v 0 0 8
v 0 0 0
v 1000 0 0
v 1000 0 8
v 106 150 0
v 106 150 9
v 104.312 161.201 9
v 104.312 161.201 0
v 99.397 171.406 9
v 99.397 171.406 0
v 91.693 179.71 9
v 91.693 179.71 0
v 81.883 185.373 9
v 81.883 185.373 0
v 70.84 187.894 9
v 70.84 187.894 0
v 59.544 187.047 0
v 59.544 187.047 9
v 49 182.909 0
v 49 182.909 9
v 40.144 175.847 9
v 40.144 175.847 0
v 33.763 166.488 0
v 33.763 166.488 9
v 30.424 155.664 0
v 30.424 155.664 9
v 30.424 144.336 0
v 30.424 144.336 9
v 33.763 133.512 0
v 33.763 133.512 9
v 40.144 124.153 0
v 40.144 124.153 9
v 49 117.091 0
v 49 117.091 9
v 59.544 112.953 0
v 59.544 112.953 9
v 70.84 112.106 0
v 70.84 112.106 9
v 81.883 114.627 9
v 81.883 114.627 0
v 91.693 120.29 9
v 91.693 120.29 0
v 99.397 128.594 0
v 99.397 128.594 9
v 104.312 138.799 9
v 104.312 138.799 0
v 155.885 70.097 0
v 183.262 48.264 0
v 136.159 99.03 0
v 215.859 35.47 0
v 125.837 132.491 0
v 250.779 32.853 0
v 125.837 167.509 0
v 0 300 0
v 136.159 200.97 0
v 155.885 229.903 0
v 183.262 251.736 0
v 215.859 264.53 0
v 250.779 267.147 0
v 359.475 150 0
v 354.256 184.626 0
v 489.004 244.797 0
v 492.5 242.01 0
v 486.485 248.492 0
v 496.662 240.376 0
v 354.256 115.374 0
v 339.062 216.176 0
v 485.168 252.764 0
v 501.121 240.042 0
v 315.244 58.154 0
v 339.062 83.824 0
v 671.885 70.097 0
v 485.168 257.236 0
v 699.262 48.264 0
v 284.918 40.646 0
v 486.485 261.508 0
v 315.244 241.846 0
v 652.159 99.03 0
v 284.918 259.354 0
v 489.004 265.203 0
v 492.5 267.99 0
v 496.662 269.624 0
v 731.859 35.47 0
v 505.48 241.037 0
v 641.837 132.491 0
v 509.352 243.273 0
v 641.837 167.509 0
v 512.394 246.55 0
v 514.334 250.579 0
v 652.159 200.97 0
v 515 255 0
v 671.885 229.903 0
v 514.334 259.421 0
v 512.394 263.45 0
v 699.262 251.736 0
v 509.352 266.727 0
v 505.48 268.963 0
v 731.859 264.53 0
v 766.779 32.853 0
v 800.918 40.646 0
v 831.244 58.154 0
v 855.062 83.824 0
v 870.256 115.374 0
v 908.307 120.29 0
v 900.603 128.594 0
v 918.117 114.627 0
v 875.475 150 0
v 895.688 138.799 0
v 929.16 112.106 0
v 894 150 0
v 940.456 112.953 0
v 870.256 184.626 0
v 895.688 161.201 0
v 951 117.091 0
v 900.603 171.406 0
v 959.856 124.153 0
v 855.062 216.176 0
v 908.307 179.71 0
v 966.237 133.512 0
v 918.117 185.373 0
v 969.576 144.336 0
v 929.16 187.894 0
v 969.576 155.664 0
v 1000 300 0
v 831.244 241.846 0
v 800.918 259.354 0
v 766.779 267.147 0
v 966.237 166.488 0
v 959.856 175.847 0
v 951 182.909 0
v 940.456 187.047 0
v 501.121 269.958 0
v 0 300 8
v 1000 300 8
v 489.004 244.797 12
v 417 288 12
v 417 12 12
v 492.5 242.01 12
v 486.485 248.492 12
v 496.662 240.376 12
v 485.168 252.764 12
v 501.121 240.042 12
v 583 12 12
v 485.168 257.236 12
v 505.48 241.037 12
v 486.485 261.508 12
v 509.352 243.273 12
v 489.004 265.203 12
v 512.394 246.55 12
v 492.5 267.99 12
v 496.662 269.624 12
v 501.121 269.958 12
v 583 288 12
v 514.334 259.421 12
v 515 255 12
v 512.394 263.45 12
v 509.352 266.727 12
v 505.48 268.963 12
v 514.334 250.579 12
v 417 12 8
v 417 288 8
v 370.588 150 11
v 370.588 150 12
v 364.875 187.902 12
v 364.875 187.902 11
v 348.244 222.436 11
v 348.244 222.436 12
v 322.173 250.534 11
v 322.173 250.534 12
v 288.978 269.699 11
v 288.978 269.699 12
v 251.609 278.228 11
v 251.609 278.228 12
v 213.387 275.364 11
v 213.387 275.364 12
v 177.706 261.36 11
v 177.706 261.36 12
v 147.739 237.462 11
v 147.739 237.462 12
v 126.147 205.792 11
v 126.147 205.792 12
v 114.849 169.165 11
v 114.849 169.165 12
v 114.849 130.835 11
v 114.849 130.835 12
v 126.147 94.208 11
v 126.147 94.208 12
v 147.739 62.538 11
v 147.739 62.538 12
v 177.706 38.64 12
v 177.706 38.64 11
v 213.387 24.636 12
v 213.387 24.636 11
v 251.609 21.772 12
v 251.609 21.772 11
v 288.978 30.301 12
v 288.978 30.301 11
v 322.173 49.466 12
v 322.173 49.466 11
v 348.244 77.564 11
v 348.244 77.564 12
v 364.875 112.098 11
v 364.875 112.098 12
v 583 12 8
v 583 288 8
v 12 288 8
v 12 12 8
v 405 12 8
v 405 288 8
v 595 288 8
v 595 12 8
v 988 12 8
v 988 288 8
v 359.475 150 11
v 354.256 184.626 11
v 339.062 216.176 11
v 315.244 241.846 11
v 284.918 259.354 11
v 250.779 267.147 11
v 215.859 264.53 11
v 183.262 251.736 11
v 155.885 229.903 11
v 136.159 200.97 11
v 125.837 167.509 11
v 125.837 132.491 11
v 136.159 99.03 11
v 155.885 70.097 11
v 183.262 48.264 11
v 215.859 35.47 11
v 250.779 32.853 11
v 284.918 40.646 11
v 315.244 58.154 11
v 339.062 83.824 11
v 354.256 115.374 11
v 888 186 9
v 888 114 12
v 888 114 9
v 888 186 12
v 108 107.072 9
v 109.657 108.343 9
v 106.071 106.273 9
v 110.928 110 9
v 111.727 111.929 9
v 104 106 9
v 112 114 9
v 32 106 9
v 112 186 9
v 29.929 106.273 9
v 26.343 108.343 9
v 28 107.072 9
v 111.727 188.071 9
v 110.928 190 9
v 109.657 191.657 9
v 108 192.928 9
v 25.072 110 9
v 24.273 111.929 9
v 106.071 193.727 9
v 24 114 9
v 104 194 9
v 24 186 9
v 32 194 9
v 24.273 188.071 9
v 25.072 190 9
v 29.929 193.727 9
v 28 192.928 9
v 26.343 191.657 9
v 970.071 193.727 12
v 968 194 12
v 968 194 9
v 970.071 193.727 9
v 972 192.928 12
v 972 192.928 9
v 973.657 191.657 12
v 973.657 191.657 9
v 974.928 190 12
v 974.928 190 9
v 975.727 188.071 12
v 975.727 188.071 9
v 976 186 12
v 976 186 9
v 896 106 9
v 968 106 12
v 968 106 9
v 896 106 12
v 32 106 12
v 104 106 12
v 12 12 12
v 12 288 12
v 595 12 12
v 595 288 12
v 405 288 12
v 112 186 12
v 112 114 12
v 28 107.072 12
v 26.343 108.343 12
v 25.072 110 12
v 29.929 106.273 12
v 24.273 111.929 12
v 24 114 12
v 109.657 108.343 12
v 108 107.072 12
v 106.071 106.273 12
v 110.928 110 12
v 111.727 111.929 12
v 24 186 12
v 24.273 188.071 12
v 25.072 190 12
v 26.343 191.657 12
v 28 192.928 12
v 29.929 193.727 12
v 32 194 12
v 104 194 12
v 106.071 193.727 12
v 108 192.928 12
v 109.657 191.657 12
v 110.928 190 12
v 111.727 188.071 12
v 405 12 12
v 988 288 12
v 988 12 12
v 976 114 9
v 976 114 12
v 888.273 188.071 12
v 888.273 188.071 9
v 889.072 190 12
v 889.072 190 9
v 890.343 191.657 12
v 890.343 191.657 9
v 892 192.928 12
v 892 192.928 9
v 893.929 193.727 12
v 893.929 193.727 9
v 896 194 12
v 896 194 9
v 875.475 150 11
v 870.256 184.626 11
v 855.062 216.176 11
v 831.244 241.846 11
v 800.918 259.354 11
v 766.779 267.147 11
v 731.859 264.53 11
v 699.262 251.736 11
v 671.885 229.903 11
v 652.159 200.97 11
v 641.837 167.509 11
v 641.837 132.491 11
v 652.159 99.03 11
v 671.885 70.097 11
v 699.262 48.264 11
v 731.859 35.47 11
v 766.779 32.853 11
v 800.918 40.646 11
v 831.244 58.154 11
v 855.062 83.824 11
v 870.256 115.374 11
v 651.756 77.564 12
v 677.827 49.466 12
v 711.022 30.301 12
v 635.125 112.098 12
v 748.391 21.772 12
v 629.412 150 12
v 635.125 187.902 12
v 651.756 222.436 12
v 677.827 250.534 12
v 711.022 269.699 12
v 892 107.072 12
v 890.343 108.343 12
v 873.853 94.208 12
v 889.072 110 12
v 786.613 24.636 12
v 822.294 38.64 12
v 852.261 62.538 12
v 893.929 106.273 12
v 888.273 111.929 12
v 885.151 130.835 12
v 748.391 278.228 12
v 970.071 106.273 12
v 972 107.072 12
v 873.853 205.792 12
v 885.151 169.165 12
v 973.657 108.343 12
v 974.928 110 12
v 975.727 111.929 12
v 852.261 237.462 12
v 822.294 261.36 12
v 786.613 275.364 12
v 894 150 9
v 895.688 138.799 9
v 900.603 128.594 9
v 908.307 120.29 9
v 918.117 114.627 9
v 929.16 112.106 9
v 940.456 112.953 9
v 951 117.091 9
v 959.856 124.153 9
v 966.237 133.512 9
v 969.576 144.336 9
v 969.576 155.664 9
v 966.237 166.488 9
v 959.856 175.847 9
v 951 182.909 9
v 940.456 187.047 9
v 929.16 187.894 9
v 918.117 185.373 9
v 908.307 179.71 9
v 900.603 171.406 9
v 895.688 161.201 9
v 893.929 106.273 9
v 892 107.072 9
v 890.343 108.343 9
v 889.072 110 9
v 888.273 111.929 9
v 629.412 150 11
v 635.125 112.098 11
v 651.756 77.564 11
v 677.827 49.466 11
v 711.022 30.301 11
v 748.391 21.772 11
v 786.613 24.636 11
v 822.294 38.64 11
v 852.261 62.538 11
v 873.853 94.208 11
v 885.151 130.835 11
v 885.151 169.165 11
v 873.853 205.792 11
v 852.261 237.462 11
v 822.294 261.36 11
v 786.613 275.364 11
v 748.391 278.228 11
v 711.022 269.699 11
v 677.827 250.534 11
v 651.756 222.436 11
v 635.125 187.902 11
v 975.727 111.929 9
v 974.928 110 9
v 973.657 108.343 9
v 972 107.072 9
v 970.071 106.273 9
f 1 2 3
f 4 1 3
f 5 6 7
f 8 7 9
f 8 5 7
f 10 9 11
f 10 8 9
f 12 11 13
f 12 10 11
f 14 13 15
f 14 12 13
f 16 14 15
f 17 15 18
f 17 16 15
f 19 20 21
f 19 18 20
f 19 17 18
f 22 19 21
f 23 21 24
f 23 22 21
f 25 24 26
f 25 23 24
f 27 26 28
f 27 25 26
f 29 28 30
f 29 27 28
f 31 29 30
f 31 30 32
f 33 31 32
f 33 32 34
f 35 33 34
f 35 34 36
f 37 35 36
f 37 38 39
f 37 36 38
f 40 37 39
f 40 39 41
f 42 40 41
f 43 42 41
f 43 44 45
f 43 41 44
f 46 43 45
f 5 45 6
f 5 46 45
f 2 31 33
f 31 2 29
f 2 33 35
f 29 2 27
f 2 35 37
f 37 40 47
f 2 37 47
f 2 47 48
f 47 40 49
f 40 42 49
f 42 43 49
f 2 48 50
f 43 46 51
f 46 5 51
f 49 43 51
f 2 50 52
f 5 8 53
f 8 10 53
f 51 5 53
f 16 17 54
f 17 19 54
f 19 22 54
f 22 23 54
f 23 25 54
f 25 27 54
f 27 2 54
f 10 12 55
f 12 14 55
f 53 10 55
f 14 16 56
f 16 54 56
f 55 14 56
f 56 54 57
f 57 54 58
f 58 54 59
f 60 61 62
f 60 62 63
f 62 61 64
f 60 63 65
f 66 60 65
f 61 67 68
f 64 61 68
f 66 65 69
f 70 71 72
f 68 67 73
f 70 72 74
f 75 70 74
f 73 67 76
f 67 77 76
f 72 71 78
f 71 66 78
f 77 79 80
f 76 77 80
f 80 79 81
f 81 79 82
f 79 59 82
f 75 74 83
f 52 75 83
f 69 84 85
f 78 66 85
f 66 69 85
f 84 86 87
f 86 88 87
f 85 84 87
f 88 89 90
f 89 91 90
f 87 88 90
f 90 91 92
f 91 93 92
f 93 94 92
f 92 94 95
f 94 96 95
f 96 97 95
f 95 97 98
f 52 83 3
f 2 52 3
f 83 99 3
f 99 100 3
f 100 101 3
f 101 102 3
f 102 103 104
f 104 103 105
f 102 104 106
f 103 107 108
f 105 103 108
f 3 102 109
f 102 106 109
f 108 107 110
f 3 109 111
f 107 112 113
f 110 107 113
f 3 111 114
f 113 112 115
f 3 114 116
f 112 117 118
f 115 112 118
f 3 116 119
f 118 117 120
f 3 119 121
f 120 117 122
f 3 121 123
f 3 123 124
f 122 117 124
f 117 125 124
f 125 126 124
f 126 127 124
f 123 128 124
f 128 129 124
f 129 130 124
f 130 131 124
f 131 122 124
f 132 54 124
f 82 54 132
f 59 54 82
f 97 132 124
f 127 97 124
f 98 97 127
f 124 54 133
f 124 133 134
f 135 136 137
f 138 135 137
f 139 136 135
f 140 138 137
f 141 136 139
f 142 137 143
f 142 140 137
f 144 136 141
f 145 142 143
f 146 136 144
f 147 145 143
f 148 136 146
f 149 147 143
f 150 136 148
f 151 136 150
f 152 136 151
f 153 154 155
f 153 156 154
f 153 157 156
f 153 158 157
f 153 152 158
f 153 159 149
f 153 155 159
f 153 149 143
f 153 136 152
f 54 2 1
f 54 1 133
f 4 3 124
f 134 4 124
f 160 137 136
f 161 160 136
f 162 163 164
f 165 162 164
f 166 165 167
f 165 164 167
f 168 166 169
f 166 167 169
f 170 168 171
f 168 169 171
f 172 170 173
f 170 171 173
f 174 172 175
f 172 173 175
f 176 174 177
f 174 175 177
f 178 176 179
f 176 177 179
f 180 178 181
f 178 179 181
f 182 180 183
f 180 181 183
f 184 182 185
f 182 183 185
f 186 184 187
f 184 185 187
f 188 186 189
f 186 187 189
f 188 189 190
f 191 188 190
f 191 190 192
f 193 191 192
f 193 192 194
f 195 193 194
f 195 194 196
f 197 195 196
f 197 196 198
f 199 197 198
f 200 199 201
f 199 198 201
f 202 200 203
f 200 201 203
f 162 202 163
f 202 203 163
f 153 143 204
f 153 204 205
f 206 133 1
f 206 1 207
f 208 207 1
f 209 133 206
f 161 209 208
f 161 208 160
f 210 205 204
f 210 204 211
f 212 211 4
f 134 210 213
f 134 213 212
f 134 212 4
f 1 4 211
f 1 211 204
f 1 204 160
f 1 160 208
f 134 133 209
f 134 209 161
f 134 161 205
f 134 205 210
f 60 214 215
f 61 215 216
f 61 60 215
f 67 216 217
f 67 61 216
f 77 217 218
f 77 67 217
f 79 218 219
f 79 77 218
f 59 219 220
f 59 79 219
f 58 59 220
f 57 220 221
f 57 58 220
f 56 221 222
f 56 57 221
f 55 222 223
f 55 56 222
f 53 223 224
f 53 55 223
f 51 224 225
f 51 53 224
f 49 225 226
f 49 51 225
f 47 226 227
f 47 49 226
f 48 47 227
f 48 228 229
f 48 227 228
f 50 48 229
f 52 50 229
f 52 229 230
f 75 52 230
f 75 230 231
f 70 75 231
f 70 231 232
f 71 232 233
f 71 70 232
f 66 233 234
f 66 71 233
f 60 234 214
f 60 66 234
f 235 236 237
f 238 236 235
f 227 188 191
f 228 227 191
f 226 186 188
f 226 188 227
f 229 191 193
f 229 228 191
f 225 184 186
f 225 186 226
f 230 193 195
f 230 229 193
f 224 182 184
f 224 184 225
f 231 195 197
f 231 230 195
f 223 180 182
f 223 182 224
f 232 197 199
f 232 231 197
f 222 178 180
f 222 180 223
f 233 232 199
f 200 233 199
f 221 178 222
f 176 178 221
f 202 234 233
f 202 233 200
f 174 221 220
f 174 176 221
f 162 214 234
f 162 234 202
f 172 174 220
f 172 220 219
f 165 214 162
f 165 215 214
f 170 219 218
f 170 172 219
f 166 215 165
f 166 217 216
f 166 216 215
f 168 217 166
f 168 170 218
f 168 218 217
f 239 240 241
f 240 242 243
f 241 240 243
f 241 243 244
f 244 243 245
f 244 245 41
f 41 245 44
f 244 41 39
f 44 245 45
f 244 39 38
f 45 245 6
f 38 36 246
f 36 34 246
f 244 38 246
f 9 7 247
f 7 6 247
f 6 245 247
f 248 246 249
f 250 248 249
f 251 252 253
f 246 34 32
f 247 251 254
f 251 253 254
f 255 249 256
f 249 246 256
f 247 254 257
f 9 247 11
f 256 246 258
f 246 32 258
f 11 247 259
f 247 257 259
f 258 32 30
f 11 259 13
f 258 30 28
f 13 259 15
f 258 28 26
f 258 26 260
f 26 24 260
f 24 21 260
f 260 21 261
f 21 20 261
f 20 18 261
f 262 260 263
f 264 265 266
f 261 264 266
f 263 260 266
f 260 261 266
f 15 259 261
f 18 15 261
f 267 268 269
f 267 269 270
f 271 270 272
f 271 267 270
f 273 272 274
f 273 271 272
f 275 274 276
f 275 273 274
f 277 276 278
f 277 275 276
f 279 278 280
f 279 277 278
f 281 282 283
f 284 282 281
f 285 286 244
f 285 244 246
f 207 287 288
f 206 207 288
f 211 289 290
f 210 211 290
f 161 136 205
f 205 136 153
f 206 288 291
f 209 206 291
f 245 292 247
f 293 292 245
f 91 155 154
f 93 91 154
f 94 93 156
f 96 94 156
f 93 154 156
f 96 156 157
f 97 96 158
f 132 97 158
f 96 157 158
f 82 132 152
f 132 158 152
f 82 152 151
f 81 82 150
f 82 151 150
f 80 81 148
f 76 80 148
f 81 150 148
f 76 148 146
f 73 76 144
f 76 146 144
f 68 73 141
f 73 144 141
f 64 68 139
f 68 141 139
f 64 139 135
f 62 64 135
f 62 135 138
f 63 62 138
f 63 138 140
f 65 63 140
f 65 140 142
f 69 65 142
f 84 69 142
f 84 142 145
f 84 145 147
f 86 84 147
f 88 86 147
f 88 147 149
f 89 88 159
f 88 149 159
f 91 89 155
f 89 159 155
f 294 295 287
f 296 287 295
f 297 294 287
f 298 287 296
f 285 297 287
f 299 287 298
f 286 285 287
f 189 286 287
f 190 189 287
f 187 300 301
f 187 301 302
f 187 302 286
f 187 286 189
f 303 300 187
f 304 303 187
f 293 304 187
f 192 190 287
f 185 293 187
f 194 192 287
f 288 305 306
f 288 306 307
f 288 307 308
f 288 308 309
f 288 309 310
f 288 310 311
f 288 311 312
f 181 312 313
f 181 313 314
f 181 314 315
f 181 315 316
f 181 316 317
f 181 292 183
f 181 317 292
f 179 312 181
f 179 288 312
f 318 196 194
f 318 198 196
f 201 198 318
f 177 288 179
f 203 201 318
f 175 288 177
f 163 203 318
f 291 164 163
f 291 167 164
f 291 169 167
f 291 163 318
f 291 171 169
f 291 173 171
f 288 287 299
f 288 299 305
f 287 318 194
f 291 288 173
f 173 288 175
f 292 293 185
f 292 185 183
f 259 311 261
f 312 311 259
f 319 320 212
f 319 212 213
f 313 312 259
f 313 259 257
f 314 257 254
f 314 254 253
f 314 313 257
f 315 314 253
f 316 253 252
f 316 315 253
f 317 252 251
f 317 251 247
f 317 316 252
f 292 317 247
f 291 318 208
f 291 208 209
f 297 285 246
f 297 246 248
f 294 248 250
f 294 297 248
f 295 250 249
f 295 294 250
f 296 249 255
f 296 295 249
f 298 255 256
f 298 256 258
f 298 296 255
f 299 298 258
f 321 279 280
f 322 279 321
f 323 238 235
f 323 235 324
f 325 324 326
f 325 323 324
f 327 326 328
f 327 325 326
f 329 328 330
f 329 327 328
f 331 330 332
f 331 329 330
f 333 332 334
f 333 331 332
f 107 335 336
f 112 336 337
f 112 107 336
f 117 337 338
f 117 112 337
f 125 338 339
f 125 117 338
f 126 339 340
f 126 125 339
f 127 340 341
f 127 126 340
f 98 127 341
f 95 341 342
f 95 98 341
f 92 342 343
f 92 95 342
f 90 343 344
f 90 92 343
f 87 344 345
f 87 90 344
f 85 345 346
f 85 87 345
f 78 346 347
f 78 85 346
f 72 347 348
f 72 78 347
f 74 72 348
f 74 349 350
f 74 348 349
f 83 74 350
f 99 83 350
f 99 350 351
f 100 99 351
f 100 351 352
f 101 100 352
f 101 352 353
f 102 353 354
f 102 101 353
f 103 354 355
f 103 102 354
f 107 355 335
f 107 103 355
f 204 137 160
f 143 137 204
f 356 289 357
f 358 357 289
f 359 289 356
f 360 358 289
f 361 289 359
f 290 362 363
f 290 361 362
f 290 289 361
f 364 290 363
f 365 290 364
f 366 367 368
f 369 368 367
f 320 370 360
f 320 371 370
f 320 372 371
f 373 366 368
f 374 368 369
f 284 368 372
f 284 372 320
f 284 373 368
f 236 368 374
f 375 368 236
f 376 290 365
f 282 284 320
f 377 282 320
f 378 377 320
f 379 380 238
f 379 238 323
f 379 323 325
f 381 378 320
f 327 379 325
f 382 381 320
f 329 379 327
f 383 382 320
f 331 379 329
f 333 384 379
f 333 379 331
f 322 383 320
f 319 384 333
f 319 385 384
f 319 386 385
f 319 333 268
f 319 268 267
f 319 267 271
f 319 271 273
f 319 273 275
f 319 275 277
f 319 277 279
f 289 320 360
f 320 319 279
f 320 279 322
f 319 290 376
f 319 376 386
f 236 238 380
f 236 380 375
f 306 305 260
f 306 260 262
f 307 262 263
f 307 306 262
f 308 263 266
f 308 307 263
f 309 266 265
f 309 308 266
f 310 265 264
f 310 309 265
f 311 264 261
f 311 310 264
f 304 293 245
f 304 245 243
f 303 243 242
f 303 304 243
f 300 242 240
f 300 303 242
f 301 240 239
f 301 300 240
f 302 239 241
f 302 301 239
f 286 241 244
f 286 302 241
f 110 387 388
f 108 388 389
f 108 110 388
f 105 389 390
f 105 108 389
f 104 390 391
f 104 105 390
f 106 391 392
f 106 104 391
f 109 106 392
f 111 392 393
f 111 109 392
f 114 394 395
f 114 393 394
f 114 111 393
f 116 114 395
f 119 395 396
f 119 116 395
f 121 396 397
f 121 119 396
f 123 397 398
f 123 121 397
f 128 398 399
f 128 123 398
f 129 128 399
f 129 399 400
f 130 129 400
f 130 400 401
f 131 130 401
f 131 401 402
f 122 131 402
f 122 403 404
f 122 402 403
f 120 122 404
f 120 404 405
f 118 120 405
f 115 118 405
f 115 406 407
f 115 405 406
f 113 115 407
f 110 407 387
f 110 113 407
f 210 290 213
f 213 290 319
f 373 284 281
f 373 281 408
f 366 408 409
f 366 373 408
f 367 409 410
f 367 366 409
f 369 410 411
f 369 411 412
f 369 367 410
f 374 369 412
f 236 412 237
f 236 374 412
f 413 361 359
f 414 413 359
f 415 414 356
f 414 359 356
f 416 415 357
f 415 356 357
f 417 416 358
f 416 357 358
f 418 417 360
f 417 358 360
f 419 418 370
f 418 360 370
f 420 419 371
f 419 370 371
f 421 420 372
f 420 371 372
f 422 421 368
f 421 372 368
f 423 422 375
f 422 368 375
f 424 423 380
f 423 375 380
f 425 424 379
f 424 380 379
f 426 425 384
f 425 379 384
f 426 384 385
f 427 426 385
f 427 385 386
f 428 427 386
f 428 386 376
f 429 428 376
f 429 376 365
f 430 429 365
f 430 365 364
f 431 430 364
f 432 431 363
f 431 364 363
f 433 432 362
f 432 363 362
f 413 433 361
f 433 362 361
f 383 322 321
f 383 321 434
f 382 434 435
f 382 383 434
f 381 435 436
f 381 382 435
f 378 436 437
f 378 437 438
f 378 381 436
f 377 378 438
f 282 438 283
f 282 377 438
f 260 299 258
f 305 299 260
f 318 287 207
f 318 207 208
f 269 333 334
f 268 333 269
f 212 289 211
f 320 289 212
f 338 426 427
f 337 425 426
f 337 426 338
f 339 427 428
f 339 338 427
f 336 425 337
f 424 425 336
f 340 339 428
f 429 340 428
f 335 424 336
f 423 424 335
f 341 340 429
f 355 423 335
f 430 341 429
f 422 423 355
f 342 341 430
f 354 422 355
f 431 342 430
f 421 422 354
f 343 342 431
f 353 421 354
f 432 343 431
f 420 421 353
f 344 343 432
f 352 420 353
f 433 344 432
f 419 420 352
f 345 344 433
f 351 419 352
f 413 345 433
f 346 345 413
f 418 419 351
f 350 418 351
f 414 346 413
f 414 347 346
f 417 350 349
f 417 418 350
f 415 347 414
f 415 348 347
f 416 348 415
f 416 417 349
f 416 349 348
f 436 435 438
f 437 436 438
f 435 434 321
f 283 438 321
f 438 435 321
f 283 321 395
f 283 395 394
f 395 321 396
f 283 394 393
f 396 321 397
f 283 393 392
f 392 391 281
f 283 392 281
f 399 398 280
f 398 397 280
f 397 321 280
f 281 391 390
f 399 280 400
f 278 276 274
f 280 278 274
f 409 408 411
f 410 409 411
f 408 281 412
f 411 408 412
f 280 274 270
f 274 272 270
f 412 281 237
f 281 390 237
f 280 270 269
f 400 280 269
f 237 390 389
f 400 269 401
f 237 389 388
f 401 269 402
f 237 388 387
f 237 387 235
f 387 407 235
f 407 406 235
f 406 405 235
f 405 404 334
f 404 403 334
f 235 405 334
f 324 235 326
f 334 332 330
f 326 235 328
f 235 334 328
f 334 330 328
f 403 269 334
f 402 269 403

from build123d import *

# Parameters (mm, degrees)
PANEL_W                      = 1000
PANEL_H                      = 300
PANEL_R                      = 117.475
PANEL_R_2                    = 38
PANEL_PLY_DEPTH              = 12
PIZEO_POCKET_CUT_DEPTH       = 3
SKETCH6_R                    = 15
CORD_CUT_DEPTH               = 12
SKETCH7_W                    = 1000
SKETCH7_H                    = 12
HORIZONTAL_HOUSING_CUT_DEPTH = 4
SKETCH8_W                    = 12
SKETCH8_H                    = 276
VERTICAL_HOUSING_CUT_DEPTH   = 4
SKETCH9_R                    = 128.5875
CUT_EXTRUDE1_DEPTH           = 1


with BuildPart() as part:
    # Panel → Panel Ply (new body)
    with BuildSketch(Plane.XY):
        with Locations((500, 150)):
            Rectangle(PANEL_W, PANEL_H)
        with Locations((242, 150)):
            Circle(PANEL_R, mode=Mode.SUBTRACT)
        with Locations((758, 150)):
            Circle(PANEL_R, mode=Mode.SUBTRACT)
        with Locations((68, 150)):
            Circle(PANEL_R_2, mode=Mode.SUBTRACT)
        with Locations(Location((932, 150, 0), (0, 0, 180))):
            Circle(PANEL_R_2, mode=Mode.SUBTRACT)
    extrude(amount=PANEL_PLY_DEPTH)

    # Sketch4 → Pizeo Pocket Cut (cut)
    with BuildSketch(Plane.XY.offset(12)):
        with BuildLine():
            Line((32, 194), (104, 194))
            ThreePointArc((104, 194), (109.656854249, 191.656854249), (112, 186))
            Line((112, 186), (112, 114))
            ThreePointArc((112, 114), (109.656854249, 108.343145751), (104, 106))
            Line((104, 106), (32, 106))
            ThreePointArc((32, 106), (26.343145751, 108.343145751), (24, 114))
            Line((24, 114), (24, 186))
            ThreePointArc((24, 186), (26.343145751, 191.656854249), (32, 194))
        make_face()
        with BuildLine():
            Line((968, 106), (896, 106))
            ThreePointArc((896, 106), (890.343145751, 108.343145751), (888, 114))
            Line((888, 114), (888, 186))
            ThreePointArc((888, 186), (890.343145751, 191.656854249), (896, 194))
            Line((896, 194), (968, 194))
            ThreePointArc((968, 194), (973.656854249, 191.656854249), (976, 186))
            Line((976, 186), (976, 114))
            ThreePointArc((976, 114), (973.656854249, 108.343145751), (968, 106))
        make_face()
    extrude(amount=-PIZEO_POCKET_CUT_DEPTH, mode=Mode.SUBTRACT)

    # Sketch6 → Cord Cut (cut)
    with BuildSketch(Plane.XY.offset(12)):
        with Locations((500, 255)):
            Circle(SKETCH6_R)
    extrude(amount=-CORD_CUT_DEPTH, mode=Mode.SUBTRACT)

    # Sketch7 → Horizontal Housing Cut (cut)
    with BuildSketch(Plane.XY.offset(12)):
        with Locations((500, 294)):
            Rectangle(SKETCH7_W, SKETCH7_H)
        with Locations((500, 6)):
            Rectangle(SKETCH7_W, SKETCH7_H)
    extrude(amount=-HORIZONTAL_HOUSING_CUT_DEPTH, mode=Mode.SUBTRACT)

    # Sketch8 → Vertical Housing Cut (cut)
    with BuildSketch(Plane.XY.offset(12)):
        with Locations((6, 150)):
            Rectangle(SKETCH8_W, SKETCH8_H)
        with Locations((994, 150)):
            Rectangle(SKETCH8_W, SKETCH8_H)
        with Locations((411, 150)):
            Rectangle(SKETCH8_W, SKETCH8_H)
        with Locations((589, 150)):
            Rectangle(SKETCH8_W, SKETCH8_H)
    extrude(amount=-VERTICAL_HOUSING_CUT_DEPTH, mode=Mode.SUBTRACT)

    # Sketch9 → Cut-Extrude1 (cut)
    with BuildSketch(Plane.XY.offset(12)):
        with Locations((242, 150)):
            Circle(SKETCH9_R)
        with Locations(Location((758, 150, 0), (0, 0, 180))):
            Circle(SKETCH9_R)
    extrude(amount=-CUT_EXTRUDE1_DEPTH, mode=Mode.SUBTRACT)


solid = part.part
